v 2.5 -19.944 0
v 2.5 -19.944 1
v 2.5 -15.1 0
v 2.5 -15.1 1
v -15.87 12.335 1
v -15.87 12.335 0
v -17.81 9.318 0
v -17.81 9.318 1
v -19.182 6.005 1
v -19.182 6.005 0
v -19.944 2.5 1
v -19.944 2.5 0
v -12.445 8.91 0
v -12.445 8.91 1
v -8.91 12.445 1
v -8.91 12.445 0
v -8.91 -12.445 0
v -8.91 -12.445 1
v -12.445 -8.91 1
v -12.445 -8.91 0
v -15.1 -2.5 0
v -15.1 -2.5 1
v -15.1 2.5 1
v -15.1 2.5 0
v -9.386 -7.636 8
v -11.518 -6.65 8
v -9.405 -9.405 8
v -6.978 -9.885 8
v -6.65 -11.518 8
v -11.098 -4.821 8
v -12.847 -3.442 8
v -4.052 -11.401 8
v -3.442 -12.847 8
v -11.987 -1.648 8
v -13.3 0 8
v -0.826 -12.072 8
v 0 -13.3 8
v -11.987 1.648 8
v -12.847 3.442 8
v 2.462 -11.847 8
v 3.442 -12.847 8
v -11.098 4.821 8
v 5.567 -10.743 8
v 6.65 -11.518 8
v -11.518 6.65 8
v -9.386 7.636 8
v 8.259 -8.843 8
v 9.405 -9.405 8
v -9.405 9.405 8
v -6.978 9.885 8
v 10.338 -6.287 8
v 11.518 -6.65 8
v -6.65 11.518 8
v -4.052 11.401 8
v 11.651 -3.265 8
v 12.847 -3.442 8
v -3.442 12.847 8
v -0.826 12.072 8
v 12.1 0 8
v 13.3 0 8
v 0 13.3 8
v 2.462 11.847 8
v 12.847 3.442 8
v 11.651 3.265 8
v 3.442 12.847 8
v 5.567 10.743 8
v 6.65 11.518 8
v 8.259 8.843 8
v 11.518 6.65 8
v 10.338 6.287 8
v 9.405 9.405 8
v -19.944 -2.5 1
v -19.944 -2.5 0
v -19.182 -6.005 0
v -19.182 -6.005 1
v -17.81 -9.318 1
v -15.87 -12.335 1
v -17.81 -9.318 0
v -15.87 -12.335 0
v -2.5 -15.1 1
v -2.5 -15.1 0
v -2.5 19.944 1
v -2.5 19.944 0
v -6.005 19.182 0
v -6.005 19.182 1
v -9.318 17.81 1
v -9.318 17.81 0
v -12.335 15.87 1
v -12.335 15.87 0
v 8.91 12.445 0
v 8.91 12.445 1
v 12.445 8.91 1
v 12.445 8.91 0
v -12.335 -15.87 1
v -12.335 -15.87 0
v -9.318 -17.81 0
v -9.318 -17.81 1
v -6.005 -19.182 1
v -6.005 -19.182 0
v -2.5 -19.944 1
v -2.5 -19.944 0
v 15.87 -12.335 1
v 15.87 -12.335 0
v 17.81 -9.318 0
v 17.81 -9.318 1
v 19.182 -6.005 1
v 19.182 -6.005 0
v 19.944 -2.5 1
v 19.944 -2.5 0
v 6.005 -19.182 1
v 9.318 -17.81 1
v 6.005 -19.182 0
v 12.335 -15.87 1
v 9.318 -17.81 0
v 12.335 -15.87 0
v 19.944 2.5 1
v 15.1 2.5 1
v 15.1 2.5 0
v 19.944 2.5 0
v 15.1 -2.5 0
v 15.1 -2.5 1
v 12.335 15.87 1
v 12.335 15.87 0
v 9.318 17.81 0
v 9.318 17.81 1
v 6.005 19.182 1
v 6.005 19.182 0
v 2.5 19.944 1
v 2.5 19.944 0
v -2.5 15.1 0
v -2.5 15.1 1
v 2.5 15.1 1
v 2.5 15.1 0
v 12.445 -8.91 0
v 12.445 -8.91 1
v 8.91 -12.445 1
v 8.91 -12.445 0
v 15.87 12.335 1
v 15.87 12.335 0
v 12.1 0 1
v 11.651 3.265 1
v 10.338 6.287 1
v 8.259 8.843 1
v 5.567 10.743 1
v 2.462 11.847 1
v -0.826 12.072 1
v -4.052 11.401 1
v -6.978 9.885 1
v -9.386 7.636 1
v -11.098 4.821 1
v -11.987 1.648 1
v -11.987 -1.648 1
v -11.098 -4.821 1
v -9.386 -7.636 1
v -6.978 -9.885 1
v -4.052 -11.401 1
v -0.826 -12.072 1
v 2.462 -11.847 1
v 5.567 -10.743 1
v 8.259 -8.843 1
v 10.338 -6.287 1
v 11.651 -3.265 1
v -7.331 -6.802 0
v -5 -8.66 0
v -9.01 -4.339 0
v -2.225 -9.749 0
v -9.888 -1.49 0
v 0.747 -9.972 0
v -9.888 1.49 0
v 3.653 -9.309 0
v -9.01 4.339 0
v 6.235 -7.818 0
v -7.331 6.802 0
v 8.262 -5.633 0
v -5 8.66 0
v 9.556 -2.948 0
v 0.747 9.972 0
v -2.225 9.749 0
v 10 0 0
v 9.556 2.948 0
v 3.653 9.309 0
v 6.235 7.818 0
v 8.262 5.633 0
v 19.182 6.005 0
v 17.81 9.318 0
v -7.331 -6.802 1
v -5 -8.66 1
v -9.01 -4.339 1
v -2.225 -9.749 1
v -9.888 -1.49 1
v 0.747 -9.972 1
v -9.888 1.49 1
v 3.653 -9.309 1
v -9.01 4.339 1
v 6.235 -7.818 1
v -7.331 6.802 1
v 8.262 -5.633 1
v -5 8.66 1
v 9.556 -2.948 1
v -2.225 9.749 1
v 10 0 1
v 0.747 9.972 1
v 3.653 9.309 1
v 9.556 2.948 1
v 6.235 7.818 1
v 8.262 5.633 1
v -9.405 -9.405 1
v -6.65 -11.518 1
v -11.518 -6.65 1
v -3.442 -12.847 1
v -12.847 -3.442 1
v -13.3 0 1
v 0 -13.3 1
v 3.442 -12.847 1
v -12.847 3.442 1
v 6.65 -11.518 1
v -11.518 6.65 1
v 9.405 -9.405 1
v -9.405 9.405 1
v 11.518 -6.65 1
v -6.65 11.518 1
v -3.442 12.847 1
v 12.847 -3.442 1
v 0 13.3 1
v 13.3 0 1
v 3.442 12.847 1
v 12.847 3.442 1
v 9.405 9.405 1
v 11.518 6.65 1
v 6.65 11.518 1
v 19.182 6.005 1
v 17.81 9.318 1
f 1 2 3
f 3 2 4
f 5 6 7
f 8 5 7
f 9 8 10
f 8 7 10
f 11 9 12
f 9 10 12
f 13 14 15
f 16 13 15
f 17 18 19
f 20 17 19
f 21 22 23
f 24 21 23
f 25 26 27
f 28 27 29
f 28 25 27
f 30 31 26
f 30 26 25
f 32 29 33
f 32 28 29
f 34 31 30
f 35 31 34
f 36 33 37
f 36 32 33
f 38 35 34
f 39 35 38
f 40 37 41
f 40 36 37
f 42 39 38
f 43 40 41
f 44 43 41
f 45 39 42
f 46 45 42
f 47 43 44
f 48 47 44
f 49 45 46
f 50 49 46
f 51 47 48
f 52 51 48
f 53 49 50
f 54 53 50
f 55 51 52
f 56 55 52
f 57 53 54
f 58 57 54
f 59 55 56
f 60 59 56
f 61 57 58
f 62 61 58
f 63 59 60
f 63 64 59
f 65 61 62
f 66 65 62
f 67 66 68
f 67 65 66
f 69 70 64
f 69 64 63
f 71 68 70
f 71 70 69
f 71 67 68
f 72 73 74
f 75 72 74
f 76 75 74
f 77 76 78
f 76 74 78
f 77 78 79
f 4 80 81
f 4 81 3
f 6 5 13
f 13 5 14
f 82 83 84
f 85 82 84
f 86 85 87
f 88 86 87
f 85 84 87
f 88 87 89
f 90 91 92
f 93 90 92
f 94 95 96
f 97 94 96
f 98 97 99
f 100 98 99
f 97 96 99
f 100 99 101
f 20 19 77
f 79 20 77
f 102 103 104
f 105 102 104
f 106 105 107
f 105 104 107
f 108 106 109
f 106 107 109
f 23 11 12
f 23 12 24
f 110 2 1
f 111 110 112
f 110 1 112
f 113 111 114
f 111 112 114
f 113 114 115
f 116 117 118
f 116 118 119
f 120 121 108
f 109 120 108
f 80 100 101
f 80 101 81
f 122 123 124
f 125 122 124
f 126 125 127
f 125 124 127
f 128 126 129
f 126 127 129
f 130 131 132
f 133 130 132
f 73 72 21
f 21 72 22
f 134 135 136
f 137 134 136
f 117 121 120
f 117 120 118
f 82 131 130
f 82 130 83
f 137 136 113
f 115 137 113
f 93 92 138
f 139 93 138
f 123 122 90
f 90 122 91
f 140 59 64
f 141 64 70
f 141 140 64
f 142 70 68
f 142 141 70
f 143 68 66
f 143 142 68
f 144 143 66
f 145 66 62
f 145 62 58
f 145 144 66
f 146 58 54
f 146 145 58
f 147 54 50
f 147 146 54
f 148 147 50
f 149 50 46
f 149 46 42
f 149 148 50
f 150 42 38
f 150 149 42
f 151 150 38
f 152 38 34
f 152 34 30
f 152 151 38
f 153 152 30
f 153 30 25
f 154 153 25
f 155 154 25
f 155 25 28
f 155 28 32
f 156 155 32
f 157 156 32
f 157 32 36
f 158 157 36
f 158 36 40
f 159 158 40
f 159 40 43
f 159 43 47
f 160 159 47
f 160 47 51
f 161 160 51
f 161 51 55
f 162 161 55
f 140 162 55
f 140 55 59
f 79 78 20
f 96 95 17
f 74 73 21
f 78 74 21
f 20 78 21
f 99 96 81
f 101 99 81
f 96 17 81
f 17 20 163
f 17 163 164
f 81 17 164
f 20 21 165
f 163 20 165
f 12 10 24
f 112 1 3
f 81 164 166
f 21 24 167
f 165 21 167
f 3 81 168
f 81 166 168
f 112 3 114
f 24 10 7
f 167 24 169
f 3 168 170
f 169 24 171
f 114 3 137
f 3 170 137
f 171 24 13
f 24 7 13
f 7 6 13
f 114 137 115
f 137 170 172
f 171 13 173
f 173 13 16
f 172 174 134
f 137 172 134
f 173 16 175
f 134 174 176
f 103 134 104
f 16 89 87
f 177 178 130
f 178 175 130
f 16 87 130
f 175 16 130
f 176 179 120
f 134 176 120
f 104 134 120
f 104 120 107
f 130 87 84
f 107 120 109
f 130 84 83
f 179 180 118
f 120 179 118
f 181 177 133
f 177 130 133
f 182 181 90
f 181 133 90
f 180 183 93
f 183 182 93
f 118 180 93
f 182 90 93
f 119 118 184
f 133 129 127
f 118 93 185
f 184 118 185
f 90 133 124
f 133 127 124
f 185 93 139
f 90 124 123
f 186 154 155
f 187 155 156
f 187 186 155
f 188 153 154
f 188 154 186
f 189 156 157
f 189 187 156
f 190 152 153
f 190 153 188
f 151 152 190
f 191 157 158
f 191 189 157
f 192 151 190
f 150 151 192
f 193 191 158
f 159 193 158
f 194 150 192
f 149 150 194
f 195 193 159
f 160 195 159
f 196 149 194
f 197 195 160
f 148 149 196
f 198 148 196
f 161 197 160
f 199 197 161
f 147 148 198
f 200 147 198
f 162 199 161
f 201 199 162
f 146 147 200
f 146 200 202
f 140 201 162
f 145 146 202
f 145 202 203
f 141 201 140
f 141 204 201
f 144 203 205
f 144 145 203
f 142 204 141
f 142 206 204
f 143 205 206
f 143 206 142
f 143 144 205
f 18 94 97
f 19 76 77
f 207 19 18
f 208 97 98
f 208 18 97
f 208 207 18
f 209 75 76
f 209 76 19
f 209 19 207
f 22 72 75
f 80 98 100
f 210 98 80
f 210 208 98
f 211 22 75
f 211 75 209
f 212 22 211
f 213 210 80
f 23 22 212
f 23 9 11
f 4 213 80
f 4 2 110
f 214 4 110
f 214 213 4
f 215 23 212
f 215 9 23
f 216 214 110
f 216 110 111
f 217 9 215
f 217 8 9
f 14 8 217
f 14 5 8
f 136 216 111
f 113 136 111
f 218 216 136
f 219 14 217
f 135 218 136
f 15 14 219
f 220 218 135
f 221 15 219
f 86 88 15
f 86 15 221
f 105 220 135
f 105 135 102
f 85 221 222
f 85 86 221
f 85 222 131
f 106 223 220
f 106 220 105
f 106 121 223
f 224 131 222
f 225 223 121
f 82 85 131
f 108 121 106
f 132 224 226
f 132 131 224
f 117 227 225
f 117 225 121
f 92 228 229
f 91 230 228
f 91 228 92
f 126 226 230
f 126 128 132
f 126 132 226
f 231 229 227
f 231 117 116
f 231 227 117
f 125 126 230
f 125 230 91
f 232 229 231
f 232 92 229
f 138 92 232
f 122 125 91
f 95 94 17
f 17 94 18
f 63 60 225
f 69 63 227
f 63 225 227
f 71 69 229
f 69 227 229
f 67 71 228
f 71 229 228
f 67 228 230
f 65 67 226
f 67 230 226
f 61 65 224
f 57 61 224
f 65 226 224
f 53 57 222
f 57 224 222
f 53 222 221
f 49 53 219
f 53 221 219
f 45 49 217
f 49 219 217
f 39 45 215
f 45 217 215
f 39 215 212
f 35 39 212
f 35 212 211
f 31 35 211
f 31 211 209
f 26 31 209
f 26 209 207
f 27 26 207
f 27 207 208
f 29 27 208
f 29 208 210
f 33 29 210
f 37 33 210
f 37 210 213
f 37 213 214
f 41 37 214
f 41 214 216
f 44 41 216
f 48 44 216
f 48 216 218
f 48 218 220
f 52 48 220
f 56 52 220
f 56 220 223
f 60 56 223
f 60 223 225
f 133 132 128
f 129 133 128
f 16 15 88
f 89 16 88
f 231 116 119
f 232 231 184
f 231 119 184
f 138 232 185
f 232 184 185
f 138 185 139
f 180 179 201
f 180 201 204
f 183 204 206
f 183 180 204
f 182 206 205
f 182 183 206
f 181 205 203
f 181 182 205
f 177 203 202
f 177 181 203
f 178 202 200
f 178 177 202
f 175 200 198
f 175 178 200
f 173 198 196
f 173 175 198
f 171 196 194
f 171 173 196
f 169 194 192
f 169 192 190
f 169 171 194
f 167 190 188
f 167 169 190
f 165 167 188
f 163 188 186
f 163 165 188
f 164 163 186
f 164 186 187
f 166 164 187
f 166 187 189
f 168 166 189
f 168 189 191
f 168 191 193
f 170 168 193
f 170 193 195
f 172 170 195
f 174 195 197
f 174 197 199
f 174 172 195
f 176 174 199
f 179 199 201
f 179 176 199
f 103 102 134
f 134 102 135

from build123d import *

# Parameters (mm, degrees)
F0_R     = 20.1
F0_R_2   = 13.3
F0_R_3   = 12.1
F0_R_4   = 10
F1_DEPTH = 1
F2_DEPTH = 8
F3_W     = 5
F3_H     = 10
F3_W_2   = 10
F3_H_2   = 5
F4_DEPTH = 1.001


with BuildPart() as f1:
    # F0 (on Top) → F1 (new body)
    with BuildSketch(Plane.XY):
        Circle(F0_R)
        Circle(F0_R_2, mode=Mode.SUBTRACT)
        Circle(F0_R_2)
        Circle(F0_R_3, mode=Mode.SUBTRACT)
        Circle(F0_R_3)
        Circle(F0_R_4, mode=Mode.SUBTRACT)
    extrude(amount=F1_DEPTH)

    # F0 (on Top) → F2 (join)
    with BuildSketch(Plane.XY):
        Circle(F0_R_2)
        Circle(F0_R_3, mode=Mode.SUBTRACT)
    extrude(amount=F2_DEPTH)

    # F3 (on face) → F4 (cut, through all)
    with BuildSketch(Plane.XY.offset(1)):
        with Locations((0, 20.1)):
            Rectangle(F3_W, F3_H)
        Polygon((-8.909545443, 12.4450793489), (-15.9806132548, 19.5161471607), (-19.5161471607, 15.9806132548), (-12.4450793489, 8.909545443), align=None)
        with Locations((-20.1, 0)):
            Rectangle(F3_W_2, F3_H_2)
        Polygon((-12.4450793489, -8.909545443), (-19.5161471607, -15.9806132548), (-15.9806132548, -19.5161471607), (-8.909545443, -12.4450793489), align=None)
        with Locations((0, -20.1)):
            Rectangle(F3_W, F3_H)
        Polygon((8.909545443, -12.4450793489), (15.9806132548, -19.5161471607), (19.5161471607, -15.9806132548), (12.4450793489, -8.909545443), align=None)
        with Locations((20.1, 0)):
            Rectangle(F3_W_2, F3_H_2)
        Polygon((12.4450793489, 8.909545443), (19.5161471607, 15.9806132548), (15.9806132548, 19.5161471607), (8.909545443, 12.4450793489), align=None)
    extrude(amount=-F4_DEPTH, mode=Mode.SUBTRACT)


solid = f1.part
